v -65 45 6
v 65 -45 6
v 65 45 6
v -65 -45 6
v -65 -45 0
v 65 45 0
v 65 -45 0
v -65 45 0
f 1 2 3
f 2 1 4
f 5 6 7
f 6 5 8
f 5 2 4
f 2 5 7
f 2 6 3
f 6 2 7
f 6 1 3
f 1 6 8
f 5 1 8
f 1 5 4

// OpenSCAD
// Starter file for task-020. Units: millimetres.
// Preserve this base at x=[-65,65], y=[-45,45], z=[0,6], then add the
// explicitly positioned top plate, posts, clearance holes, slots, and holes.
$fn = 64;

module plate(w, d, t) {
    translate([-w / 2, -d / 2, 0]) cube([w, d, t]);
}

plate(130, 90, 6);
